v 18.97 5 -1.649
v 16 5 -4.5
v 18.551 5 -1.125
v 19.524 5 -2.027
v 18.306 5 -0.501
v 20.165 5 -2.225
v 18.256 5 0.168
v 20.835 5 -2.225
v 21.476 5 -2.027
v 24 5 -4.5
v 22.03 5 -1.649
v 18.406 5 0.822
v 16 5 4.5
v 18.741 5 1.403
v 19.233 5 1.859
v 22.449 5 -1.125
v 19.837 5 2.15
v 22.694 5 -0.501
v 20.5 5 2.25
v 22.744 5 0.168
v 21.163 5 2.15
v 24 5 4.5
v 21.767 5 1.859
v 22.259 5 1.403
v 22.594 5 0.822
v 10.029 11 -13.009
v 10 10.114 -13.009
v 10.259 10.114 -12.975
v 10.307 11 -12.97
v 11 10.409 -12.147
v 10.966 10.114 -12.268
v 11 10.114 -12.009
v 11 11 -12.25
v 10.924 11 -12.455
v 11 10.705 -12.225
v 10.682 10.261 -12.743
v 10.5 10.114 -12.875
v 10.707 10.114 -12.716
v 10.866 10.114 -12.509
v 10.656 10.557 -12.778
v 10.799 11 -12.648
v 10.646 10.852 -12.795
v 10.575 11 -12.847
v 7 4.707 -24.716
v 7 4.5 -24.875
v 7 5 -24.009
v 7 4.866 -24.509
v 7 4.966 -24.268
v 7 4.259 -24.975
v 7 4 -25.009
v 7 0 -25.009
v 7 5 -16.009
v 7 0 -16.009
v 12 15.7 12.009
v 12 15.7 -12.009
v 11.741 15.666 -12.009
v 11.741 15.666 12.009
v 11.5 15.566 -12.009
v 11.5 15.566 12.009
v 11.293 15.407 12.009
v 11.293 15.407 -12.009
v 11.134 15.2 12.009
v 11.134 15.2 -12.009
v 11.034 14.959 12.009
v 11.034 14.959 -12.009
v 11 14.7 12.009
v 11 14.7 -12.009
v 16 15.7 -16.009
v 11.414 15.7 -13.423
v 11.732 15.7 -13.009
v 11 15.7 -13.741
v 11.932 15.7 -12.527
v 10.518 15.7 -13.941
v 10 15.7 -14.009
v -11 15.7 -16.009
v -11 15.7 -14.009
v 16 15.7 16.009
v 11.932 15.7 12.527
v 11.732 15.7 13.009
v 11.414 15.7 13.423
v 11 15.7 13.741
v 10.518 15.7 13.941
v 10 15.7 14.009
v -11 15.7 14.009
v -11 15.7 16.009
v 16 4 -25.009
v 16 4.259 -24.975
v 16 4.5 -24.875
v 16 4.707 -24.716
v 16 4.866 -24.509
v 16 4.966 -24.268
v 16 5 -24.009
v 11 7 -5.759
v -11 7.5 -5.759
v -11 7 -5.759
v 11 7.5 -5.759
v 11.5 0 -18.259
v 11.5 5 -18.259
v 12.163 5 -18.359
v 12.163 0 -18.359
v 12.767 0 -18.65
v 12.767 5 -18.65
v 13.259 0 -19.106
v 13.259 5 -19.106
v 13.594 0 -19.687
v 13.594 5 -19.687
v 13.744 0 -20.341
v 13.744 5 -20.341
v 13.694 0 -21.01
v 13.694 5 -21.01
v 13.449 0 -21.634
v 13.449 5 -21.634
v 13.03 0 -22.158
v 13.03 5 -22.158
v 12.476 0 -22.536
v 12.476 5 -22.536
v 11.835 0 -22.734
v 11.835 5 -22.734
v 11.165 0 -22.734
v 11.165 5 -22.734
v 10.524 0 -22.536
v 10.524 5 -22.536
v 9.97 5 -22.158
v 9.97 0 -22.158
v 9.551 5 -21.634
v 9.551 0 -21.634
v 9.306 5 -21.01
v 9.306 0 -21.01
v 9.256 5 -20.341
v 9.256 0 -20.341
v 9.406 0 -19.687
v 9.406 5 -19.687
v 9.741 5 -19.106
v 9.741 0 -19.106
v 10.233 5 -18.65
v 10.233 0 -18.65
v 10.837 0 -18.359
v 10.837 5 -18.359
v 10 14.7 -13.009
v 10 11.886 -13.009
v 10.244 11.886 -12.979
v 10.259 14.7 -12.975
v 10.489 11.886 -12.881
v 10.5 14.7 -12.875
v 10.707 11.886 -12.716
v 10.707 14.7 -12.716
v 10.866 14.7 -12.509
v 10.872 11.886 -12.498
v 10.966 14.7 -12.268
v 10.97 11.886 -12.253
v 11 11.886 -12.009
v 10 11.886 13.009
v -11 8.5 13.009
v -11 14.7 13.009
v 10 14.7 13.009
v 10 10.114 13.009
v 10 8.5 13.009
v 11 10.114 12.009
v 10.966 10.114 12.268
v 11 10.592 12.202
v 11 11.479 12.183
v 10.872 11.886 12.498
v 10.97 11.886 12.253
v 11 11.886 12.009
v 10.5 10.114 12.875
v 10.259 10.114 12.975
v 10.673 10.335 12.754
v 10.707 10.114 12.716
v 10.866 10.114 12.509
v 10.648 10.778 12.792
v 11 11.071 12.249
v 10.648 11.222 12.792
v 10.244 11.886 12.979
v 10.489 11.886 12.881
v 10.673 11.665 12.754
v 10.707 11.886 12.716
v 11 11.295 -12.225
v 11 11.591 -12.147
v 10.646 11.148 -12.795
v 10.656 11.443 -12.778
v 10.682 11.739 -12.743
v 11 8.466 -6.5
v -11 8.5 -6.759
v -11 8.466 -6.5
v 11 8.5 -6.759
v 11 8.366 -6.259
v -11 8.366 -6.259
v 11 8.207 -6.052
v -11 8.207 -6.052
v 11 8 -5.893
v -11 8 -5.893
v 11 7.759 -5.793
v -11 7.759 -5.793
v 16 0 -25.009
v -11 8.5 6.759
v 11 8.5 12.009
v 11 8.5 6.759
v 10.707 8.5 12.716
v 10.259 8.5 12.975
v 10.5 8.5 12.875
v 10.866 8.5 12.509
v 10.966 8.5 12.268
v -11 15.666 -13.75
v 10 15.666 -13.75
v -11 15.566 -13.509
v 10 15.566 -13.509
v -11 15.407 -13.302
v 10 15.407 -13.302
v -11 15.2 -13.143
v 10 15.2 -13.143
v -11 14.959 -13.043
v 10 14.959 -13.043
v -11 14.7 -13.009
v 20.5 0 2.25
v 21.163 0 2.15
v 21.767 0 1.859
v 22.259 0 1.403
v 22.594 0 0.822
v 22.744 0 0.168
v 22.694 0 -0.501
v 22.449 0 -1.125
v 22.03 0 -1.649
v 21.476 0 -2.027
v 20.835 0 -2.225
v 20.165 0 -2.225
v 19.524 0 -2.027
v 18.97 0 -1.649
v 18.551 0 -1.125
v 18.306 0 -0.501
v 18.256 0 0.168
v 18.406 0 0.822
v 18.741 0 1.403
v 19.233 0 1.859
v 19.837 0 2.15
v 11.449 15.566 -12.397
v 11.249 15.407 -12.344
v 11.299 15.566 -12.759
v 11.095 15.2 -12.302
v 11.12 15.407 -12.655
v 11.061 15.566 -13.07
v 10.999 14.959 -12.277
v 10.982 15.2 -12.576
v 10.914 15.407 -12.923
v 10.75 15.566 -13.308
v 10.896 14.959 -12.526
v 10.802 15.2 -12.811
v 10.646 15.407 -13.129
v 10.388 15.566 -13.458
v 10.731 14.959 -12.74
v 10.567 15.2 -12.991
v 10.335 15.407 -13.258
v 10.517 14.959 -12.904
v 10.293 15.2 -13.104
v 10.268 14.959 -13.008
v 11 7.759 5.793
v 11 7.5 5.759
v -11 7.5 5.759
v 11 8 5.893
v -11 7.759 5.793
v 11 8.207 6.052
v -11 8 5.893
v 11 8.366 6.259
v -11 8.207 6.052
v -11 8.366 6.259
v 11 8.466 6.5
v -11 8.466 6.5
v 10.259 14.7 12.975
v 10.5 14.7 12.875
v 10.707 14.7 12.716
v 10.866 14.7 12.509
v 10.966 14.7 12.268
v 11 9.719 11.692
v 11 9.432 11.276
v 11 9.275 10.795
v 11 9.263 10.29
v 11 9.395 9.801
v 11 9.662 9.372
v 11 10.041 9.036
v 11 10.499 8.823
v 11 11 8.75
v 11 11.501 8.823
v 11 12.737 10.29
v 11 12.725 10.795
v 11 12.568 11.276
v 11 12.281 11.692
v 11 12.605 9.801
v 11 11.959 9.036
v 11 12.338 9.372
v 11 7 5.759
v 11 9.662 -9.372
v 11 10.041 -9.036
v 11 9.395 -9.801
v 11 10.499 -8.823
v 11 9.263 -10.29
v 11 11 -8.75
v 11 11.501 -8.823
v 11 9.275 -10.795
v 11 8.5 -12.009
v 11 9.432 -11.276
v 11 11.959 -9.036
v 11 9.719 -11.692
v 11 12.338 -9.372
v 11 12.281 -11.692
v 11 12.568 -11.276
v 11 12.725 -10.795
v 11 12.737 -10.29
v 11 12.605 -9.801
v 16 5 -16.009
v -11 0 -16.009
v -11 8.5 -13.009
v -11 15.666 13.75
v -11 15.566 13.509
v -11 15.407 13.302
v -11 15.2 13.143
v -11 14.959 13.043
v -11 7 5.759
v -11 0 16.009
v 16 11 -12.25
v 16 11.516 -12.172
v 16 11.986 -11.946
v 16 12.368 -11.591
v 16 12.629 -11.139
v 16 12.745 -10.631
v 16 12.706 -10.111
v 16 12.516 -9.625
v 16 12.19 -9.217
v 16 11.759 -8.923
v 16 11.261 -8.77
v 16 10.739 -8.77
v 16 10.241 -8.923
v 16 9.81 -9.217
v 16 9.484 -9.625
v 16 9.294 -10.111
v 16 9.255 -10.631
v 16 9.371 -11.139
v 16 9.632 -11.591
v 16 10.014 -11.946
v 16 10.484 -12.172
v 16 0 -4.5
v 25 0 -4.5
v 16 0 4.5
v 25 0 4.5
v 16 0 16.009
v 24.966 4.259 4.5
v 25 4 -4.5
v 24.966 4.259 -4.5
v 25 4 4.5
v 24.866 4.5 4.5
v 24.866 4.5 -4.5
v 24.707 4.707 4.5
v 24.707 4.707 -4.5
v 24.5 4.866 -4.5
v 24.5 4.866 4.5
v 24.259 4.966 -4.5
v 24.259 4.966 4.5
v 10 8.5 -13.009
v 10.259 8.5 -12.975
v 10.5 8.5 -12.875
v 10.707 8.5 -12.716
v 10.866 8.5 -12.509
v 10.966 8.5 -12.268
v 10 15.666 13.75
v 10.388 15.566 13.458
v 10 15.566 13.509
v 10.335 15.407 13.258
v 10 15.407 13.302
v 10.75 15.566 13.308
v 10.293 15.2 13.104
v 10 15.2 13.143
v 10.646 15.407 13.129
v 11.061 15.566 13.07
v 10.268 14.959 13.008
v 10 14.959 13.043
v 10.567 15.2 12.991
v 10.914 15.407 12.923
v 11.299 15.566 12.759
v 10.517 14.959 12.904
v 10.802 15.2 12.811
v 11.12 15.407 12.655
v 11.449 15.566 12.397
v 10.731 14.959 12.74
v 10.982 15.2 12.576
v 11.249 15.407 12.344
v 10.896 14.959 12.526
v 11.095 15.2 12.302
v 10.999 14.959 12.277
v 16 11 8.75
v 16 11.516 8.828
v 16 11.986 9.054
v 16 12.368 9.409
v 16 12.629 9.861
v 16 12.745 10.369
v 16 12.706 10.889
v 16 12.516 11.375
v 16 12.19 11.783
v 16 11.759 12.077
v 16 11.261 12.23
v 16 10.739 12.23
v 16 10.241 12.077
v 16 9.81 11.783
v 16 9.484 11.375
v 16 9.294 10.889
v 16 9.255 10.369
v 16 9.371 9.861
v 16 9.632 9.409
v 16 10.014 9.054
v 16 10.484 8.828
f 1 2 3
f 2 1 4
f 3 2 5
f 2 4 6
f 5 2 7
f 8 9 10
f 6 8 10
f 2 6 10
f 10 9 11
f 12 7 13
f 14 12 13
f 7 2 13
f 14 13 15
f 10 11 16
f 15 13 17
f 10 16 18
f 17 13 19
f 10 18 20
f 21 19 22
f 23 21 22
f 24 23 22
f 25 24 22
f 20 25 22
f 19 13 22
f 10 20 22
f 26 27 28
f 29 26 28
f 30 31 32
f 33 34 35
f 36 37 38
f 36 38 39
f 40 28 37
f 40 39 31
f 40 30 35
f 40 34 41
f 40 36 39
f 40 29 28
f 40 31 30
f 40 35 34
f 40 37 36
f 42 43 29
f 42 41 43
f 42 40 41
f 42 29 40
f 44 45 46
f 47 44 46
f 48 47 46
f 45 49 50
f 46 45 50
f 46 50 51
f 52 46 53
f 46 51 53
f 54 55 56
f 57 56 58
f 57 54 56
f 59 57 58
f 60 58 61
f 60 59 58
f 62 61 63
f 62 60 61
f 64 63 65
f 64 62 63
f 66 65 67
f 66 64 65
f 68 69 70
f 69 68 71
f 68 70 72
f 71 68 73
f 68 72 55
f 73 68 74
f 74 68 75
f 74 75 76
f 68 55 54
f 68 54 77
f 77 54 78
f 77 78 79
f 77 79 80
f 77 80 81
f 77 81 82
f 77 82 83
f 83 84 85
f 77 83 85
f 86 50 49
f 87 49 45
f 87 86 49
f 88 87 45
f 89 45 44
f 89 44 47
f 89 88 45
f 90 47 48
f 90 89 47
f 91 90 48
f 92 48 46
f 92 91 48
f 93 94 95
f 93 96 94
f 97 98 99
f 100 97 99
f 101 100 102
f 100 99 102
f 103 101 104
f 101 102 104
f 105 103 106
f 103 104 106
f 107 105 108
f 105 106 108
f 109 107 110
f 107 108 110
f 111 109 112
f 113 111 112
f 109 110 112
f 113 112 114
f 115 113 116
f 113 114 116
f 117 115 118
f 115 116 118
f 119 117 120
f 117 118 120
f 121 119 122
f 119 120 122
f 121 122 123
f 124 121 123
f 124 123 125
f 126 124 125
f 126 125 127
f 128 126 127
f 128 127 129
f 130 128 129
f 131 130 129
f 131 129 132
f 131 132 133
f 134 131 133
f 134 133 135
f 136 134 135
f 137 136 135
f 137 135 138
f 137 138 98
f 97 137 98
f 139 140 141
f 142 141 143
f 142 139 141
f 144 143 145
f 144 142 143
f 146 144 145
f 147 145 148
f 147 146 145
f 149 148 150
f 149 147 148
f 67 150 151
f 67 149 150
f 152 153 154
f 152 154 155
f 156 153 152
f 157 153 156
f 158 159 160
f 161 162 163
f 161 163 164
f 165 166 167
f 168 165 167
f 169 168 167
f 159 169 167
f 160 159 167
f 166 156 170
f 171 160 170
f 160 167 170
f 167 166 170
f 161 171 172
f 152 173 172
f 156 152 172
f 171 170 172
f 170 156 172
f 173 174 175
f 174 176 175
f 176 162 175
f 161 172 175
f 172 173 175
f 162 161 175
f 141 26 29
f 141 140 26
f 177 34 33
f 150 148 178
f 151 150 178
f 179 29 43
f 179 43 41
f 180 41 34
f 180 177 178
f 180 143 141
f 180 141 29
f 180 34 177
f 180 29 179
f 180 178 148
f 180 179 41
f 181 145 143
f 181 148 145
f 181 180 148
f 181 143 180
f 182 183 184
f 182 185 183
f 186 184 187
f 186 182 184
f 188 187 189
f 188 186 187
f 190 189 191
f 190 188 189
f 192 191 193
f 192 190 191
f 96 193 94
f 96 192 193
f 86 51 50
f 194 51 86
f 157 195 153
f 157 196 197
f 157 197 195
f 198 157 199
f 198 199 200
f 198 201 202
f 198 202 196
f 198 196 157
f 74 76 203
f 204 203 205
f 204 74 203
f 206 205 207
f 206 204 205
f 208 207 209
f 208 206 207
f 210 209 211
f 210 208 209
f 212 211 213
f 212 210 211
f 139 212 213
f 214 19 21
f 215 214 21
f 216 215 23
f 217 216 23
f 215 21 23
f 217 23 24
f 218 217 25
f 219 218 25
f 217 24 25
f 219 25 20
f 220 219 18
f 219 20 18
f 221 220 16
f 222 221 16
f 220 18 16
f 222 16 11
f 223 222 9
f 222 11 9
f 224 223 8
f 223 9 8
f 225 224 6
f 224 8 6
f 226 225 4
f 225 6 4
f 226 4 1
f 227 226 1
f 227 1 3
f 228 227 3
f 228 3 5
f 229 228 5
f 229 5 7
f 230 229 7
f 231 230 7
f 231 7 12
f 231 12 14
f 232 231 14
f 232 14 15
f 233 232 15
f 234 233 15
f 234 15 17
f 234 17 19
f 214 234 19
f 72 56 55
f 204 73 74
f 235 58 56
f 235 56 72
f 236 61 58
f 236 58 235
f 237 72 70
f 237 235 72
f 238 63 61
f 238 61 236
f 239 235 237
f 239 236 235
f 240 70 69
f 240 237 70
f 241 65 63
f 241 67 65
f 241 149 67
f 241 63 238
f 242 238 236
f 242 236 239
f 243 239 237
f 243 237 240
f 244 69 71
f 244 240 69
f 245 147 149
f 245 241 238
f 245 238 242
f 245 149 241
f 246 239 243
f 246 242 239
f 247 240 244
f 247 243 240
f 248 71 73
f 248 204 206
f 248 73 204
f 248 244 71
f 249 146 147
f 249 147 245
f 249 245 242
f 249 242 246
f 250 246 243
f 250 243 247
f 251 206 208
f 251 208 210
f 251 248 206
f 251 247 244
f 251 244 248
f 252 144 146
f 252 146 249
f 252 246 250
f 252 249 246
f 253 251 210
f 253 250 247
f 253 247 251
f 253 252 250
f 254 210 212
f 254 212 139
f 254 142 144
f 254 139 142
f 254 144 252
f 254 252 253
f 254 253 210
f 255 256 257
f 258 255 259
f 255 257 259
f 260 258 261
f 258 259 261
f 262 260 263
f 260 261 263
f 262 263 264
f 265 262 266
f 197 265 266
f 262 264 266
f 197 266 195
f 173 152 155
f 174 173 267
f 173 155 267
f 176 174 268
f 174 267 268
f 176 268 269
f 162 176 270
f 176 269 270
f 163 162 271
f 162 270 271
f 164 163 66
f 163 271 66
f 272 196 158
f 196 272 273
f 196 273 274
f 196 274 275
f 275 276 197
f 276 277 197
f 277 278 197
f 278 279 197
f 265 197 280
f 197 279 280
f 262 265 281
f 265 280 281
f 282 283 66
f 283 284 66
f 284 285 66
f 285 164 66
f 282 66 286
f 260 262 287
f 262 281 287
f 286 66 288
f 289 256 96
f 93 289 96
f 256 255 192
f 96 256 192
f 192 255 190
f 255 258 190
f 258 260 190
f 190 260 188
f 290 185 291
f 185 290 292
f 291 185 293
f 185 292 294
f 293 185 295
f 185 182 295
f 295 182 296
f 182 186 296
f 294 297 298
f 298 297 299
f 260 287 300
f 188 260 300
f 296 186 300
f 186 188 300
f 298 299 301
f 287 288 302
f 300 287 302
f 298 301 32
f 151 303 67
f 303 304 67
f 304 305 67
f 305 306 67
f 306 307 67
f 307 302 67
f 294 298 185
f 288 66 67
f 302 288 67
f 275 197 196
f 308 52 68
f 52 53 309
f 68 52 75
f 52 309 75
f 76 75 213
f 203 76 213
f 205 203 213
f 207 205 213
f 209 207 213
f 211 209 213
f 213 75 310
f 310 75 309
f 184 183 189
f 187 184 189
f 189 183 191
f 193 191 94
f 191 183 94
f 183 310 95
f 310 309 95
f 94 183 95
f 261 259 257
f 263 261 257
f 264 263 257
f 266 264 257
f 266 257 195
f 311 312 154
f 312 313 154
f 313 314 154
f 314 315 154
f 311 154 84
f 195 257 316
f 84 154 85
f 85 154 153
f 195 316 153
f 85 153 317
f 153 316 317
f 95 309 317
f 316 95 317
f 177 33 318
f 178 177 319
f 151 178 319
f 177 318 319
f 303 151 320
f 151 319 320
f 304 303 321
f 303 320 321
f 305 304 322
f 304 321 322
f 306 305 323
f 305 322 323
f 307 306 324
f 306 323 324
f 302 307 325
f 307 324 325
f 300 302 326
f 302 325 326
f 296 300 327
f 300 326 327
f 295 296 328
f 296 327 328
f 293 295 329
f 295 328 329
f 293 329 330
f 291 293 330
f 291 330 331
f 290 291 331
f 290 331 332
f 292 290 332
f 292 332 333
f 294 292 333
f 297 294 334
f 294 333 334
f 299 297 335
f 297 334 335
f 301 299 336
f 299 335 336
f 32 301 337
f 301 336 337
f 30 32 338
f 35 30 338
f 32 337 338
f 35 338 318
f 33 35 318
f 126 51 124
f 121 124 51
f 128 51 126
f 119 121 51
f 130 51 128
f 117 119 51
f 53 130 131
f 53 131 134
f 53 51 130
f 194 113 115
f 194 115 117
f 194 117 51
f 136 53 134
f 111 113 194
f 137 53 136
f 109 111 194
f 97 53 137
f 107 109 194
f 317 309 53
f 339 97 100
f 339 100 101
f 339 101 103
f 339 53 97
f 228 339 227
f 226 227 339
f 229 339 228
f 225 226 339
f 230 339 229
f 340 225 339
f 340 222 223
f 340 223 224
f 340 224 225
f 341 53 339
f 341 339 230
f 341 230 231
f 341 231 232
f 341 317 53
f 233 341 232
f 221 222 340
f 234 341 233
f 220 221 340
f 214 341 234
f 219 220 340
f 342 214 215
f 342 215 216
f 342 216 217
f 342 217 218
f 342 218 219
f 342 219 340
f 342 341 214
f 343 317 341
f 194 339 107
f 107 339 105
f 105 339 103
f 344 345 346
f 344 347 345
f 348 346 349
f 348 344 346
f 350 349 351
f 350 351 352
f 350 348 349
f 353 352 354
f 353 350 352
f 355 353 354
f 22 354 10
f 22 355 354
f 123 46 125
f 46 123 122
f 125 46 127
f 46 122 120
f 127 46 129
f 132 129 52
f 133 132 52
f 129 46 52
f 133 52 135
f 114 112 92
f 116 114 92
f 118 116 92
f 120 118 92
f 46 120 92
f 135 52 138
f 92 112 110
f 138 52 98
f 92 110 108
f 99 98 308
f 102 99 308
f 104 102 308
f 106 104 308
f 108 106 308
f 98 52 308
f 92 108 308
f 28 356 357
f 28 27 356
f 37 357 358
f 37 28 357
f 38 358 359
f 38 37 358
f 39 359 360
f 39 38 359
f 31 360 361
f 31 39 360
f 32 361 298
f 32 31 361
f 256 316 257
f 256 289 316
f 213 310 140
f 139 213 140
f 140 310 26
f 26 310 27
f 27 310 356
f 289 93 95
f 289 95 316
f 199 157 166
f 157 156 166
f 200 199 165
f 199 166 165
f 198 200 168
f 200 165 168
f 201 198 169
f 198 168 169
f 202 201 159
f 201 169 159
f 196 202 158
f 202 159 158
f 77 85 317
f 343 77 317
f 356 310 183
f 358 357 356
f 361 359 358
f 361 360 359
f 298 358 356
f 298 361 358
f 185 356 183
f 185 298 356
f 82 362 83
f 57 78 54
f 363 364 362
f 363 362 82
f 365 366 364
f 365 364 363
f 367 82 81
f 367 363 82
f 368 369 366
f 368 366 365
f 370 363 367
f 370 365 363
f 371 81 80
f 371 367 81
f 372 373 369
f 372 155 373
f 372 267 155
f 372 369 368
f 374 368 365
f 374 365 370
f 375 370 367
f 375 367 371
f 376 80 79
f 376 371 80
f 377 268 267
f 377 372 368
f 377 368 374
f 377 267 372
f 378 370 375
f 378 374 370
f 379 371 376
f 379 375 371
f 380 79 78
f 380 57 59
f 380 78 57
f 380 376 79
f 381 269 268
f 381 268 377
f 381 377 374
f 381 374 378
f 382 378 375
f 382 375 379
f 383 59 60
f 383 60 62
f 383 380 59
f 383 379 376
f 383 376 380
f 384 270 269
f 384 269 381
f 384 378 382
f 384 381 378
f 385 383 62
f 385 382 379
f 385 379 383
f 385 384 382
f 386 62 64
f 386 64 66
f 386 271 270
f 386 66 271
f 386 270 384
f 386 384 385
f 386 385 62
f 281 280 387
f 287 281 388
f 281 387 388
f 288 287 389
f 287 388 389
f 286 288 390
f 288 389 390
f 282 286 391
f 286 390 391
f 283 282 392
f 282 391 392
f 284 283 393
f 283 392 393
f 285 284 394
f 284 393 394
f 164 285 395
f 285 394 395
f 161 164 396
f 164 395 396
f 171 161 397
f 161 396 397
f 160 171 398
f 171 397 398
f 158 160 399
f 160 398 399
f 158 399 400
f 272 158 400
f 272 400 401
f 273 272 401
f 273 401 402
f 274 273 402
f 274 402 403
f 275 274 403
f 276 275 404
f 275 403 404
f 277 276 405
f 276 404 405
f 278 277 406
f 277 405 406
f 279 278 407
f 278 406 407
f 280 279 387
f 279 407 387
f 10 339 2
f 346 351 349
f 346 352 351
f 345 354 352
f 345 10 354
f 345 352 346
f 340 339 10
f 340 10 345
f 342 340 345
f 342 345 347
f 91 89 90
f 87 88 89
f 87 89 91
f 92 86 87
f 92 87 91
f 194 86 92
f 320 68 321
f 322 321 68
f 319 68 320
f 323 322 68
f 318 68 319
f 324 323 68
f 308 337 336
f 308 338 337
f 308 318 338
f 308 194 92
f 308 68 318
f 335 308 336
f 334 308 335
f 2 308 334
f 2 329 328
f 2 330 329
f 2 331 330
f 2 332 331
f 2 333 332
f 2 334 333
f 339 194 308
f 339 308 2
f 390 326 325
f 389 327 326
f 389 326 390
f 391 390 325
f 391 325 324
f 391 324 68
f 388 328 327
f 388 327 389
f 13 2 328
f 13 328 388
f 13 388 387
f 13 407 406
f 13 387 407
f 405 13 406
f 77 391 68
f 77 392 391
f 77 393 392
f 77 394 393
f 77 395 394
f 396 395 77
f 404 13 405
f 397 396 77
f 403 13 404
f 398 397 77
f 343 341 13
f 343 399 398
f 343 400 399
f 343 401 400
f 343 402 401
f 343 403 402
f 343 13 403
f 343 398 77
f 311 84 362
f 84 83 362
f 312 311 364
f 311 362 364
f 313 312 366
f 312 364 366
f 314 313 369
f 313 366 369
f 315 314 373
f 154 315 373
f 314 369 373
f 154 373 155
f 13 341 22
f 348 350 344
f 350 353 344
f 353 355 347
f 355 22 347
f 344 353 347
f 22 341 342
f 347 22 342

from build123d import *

# Parameters (mm, degrees)
BOSS_EXTRUDE1_DEPTH = 11
SKETCH3_W           = 22
SKETCH3_H           = 3
BOSS_EXTRUDE2_DEPTH = 15.7
BOSS_EXTRUDE3_DEPTH = 5
SKETCH5_R           = 1.75
CUT_EXTRUDE1_DEPTH  = 36.096650541
SKETCH6_W           = 9
SKETCH6_H           = 9
BOSS_EXTRUDE4_DEPTH = 5
SKETCH7_R           = 2.25
CUT_EXTRUDE2_DEPTH  = 37.945027801
FILLET1_R           = 1


with BuildPart() as part:
    # Sketch1 → Boss-Extrude1 (new, symmetric)
    with BuildSketch(Plane(origin=(0, 0, 0), x_dir=(0, 0, -1), z_dir=(1, 0, 0))):
        Polygon((-13.0089, 0), (13.0089, 0), (13.0089, 8.5), (5.7589, 8.5), (5.7589, 7), (-5.7589, 7), (-5.7589, 8.5), (-13.0089, 8.5), align=None)
    extrude(amount=BOSS_EXTRUDE1_DEPTH, both=True)

    # Sketch3 → Boss-Extrude2 (add)
    with BuildSketch(Plane.XZ):
        with Locations((0, -14.5089)):
            Rectangle(SKETCH3_W, SKETCH3_H)
        with Locations((0, 14.5089)):
            Rectangle(SKETCH3_W, SKETCH3_H)
    extrude(amount=-BOSS_EXTRUDE2_DEPTH)

    # Sketch4 → Boss-Extrude3 (add)
    with BuildSketch(Plane(origin=(11, 0, 0), x_dir=(0, 0, -1), z_dir=(1, 0, 0))):
        Polygon((-8.8, 15.7), (-16.0089, 15.7), (-16.0089, 0), (16.0089, 0), (16.0089, 15.7), align=None)
    extrude(amount=BOSS_EXTRUDE3_DEPTH)

    # Sketch5 → Cut-Extrude1 (cut, through all)
    with BuildSketch(Plane(origin=(16, 0, 0), x_dir=(0, 0, -1), z_dir=(1, 0, 0))):
        with Locations((-10.5, 11)):
            Circle(SKETCH5_R)
        with Locations((10.5, 11)):
            Circle(SKETCH5_R)
    extrude(amount=-CUT_EXTRUDE1_DEPTH, mode=Mode.SUBTRACT)

    # Sketch6 → Boss-Extrude4 (add)
    with BuildSketch(Plane.XZ):
        with Locations((20.5, 0)):
            Rectangle(SKETCH6_W, SKETCH6_H)
        with Locations((11.5, -20.5089)):
            Rectangle(SKETCH6_W, SKETCH6_H)
    extrude(amount=-BOSS_EXTRUDE4_DEPTH)

    # Sketch7 → Cut-Extrude2 (cut, through all)
    with BuildSketch(Plane(origin=(0, 5, 0), x_dir=(1, 0, 0), z_dir=(0, 1, 0))):
        with Locations(Location((20.5, 0, 0), (0, 0, 270))):
            Circle(SKETCH7_R)
        with Locations(Location((11.5, 20.5089, 0), (0, 0, 270))):
            Circle(SKETCH7_R)
    extrude(amount=-CUT_EXTRUDE2_DEPTH, mode=Mode.SUBTRACT)

    # Fillet1
    fillet1_edges = [part.edges().sort_by_distance(p)[0] for p in [
        (0, 8.5, 5.7589),
        (0, 8.5, -5.7589),
        (0, 15.7, -13.0089),
        (11, 12.1, -13.0089),
        (11, 12.1, 13.0089),
        (0, 15.7, 13.0089),
        (11, 15.7, 0),
        (25, 5, 0),
        (11.5, 5, -25.0089),
    ]]
    fillet(fillet1_edges, radius=FILLET1_R)


solid = part.part
